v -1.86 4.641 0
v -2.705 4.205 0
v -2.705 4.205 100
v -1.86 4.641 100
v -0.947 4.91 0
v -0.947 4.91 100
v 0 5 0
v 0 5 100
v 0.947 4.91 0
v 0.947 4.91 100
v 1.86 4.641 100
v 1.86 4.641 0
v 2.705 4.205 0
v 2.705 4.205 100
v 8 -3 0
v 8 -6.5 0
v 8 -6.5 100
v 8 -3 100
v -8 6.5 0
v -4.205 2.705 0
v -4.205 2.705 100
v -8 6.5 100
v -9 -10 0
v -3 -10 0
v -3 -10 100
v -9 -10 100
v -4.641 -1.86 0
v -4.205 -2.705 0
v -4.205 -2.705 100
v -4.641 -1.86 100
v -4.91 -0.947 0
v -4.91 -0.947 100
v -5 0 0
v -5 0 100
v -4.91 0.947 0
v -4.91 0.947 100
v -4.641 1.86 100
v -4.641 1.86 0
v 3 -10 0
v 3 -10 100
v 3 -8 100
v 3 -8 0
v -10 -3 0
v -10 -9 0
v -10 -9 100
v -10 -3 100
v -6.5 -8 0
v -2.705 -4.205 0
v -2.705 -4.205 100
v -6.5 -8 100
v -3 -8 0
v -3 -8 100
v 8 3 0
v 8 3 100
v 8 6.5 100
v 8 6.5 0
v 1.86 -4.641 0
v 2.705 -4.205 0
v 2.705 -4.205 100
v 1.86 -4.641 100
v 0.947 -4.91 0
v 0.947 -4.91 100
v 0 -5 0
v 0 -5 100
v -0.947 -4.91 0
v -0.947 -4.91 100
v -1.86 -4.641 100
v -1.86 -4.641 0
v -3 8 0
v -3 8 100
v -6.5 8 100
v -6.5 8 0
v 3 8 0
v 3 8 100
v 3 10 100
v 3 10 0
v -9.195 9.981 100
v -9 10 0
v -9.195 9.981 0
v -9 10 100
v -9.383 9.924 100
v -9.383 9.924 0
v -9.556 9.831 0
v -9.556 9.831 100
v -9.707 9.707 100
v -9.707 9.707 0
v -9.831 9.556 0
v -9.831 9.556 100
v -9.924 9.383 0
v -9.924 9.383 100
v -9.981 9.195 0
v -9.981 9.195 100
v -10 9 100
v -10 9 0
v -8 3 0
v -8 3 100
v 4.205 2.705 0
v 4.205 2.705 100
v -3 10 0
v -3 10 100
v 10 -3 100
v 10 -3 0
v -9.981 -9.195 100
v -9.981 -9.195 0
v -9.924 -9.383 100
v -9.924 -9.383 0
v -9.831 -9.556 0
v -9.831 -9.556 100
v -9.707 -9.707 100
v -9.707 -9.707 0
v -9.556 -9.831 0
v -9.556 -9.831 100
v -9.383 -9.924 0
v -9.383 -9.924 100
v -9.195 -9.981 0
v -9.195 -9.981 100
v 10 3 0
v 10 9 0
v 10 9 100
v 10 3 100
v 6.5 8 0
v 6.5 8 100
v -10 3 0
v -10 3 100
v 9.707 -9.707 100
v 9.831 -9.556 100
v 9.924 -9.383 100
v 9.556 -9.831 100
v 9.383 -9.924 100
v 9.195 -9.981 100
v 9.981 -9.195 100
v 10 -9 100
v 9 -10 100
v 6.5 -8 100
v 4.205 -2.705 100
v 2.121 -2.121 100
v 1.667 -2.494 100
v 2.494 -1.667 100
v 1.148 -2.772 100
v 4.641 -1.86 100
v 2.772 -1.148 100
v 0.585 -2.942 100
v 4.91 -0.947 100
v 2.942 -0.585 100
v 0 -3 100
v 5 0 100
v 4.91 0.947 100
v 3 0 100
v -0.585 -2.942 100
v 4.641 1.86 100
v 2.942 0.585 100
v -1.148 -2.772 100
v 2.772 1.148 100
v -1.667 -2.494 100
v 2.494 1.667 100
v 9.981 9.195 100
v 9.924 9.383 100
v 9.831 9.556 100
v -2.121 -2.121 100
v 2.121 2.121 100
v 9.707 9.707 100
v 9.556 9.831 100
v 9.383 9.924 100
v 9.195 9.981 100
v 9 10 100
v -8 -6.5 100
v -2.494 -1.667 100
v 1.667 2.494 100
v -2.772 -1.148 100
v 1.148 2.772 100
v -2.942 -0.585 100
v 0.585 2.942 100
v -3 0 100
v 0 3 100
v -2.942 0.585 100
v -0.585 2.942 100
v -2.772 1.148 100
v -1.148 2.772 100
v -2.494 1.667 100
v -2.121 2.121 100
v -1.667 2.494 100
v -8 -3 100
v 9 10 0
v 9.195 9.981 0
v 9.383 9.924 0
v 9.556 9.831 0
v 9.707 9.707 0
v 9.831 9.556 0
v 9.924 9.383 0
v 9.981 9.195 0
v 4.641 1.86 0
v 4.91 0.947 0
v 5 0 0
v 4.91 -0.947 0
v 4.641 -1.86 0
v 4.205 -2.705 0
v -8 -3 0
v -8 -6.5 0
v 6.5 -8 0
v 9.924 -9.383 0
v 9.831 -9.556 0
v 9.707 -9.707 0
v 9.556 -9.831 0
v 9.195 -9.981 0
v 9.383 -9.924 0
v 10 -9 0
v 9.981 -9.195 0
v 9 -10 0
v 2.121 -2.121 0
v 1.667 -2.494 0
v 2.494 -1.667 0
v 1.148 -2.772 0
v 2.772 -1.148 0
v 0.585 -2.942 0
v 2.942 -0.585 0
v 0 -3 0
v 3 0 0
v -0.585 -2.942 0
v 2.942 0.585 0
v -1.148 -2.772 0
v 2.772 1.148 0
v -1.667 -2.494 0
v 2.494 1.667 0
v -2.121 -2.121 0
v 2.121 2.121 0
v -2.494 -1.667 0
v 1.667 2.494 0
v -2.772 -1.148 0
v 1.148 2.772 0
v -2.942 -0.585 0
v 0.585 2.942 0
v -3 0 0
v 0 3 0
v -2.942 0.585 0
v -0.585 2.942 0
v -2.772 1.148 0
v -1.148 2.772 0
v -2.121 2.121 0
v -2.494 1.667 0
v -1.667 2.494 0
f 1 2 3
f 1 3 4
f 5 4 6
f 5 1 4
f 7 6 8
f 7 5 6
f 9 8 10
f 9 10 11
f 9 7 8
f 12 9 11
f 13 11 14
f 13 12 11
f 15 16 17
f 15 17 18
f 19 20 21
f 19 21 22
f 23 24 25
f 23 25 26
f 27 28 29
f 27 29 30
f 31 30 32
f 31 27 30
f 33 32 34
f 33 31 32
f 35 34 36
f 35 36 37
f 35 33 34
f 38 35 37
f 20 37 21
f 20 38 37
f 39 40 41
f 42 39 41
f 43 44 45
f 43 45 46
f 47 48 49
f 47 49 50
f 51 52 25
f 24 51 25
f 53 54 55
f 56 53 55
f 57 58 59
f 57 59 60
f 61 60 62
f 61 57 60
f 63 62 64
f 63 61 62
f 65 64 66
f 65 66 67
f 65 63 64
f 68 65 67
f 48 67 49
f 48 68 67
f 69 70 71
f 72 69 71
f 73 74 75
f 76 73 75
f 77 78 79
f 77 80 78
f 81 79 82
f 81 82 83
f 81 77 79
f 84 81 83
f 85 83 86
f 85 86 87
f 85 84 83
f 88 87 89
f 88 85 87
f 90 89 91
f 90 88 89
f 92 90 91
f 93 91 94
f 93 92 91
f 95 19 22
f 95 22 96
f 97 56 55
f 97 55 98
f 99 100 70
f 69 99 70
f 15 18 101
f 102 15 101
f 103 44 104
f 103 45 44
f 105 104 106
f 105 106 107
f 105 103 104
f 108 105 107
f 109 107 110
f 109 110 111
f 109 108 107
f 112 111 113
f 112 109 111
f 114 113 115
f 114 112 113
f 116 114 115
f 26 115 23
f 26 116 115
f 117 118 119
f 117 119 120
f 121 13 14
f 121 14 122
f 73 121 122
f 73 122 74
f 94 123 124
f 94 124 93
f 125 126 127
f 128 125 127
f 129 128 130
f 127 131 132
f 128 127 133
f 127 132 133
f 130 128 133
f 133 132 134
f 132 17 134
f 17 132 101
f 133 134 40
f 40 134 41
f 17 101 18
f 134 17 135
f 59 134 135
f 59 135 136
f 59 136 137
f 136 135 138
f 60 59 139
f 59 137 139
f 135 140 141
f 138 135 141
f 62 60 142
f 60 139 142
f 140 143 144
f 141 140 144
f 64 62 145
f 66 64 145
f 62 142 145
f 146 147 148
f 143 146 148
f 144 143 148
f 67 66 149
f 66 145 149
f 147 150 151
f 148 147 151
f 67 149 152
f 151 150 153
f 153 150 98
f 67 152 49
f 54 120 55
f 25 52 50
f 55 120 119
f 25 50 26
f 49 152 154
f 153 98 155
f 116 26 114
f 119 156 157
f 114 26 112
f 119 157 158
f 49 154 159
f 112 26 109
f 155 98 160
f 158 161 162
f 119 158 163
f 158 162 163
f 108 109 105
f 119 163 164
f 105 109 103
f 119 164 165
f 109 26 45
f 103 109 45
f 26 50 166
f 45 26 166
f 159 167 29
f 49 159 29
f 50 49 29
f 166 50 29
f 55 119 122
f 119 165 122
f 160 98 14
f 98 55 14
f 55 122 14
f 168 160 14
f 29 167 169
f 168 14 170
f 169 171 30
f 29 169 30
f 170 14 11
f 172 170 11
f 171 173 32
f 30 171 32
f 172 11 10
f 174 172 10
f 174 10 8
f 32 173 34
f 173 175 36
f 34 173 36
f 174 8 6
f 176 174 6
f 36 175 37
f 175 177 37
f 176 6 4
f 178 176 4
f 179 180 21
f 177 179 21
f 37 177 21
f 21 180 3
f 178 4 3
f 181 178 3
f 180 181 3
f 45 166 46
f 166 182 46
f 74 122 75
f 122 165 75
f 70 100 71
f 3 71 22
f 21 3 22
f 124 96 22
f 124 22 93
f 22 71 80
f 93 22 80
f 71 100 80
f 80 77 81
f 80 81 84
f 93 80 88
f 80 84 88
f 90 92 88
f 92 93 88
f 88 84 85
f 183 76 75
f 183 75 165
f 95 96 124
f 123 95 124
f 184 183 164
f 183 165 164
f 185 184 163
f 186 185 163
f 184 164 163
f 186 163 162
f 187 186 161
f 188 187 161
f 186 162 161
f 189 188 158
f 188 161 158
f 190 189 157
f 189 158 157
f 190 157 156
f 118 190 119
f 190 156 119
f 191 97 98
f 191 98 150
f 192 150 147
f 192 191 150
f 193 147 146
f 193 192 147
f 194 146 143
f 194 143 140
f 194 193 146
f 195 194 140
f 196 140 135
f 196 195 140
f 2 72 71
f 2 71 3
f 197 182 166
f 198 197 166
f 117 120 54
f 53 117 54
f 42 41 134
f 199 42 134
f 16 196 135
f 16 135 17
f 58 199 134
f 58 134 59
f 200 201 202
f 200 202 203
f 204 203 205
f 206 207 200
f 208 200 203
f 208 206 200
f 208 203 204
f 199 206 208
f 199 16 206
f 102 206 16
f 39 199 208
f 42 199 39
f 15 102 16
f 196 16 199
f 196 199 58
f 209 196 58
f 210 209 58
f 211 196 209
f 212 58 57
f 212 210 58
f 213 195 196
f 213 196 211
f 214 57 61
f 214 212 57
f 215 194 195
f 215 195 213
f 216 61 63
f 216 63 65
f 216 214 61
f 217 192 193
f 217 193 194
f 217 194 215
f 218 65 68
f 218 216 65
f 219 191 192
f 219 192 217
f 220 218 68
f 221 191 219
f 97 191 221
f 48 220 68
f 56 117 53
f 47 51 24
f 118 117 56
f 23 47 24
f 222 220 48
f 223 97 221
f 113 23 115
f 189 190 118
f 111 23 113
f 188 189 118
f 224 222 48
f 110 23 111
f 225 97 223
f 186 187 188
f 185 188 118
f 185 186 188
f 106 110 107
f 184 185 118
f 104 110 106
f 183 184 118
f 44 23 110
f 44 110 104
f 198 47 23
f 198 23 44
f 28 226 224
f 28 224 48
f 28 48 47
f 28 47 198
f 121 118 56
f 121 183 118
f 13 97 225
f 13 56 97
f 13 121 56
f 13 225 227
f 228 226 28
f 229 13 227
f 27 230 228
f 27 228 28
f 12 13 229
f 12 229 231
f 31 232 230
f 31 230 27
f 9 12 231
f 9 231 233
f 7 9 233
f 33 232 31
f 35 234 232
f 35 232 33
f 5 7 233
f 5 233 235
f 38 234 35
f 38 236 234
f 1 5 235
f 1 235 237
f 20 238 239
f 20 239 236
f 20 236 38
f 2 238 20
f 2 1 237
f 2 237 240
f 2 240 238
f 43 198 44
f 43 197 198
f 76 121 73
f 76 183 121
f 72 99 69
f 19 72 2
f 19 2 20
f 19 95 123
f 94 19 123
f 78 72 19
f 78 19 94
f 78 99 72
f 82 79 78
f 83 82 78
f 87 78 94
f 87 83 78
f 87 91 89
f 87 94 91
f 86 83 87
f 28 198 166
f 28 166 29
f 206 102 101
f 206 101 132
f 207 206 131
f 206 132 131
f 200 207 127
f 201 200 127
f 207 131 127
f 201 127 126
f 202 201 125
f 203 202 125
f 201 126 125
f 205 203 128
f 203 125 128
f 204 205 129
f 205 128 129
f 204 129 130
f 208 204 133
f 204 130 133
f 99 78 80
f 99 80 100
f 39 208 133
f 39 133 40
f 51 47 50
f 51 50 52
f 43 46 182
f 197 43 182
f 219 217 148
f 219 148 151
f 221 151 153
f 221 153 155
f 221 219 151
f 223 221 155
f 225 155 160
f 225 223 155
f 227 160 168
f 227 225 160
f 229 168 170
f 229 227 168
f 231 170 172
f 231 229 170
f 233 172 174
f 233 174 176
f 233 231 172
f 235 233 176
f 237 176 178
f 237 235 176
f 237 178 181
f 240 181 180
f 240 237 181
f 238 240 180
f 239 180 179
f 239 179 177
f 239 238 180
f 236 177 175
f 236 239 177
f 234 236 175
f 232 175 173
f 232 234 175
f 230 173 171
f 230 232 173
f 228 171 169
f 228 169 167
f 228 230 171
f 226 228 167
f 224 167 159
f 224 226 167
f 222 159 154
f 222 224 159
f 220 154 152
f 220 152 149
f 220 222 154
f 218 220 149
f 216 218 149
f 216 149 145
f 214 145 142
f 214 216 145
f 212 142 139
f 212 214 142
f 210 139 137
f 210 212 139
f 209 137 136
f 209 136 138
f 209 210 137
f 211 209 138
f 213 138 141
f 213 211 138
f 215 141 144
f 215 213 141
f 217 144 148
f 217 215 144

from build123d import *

# Parameters (mm, degrees)
CROQUIS2_R              = 3
SALIENTE_EXTRUIR2_DEPTH = 100
REDONDEO2_R             = 1


with BuildPart() as part:
    # Croquis2 → Saliente-Extruir2 (new body)
    with BuildSketch(Plane.XY):
        with BuildLine():
            Line((-10, 10), (-3, 10))
            Line((-3, 10), (-3, 8))
            Line((-3, 8), (-6.5, 8))
            Line((-6.5, 8), (-2.70506874, 4.20506874))
            ThreePointArc((-2.70506874, 4.20506874), (0, 5), (2.70506874, 4.20506874))
            Line((2.70506874, 4.20506874), (6.5, 8))
            Line((6.5, 8), (3, 8))
            Line((3, 8), (3, 10))
            Line((3, 10), (10, 10))
            Line((10, 10), (10, 3))
            Line((10, 3), (8, 3))
            Line((8, 3), (8, 6.5))
            Line((8, 6.5), (4.20506874, 2.70506874))
            ThreePointArc((4.20506874, 2.70506874), (5, 0), (4.20506874, -2.70506874))
            Line((4.20506874, -2.70506874), (8, -6.5))
            Line((8, -6.5), (8, -3))
            Line((8, -3), (10, -3))
            Line((10, -3), (10, -10))
            Line((10, -10), (3, -10))
            Line((3, -10), (3, -8))
            Line((3, -8), (6.5, -8))
            Line((6.5, -8), (2.70506874, -4.20506874))
            ThreePointArc((2.70506874, -4.20506874), (0, -5), (-2.70506874, -4.20506874))
            Line((-2.70506874, -4.20506874), (-6.5, -8))
            Line((-6.5, -8), (-3, -8))
            Line((-3, -8), (-3, -10))
            Line((-3, -10), (-10, -10))
            Line((-10, -10), (-10, -3))
            Line((-10, -3), (-8, -3))
            Line((-8, -3), (-8, -6.5))
            Line((-8, -6.5), (-4.20506874, -2.70506874))
            ThreePointArc((-4.20506874, -2.70506874), (-5, 0), (-4.20506874, 2.70506874))
            Line((-4.20506874, 2.70506874), (-8, 6.5))
            Line((-8, 6.5), (-8, 3))
            Line((-8, 3), (-10, 3))
            Line((-10, 3), (-10, 10))
        make_face()
        Circle(CROQUIS2_R, mode=Mode.SUBTRACT)
    extrude(amount=SALIENTE_EXTRUIR2_DEPTH)

    # Redondeo2
    redondeo2_edges = [part.edges().sort_by_distance(p)[0] for p in [
        (-10, 10, 50),
        (10, 10, 50),
        (10, -10, 50),
        (-10, -10, 50),
    ]]
    fillet(redondeo2_edges, radius=REDONDEO2_R)


solid = part.part
